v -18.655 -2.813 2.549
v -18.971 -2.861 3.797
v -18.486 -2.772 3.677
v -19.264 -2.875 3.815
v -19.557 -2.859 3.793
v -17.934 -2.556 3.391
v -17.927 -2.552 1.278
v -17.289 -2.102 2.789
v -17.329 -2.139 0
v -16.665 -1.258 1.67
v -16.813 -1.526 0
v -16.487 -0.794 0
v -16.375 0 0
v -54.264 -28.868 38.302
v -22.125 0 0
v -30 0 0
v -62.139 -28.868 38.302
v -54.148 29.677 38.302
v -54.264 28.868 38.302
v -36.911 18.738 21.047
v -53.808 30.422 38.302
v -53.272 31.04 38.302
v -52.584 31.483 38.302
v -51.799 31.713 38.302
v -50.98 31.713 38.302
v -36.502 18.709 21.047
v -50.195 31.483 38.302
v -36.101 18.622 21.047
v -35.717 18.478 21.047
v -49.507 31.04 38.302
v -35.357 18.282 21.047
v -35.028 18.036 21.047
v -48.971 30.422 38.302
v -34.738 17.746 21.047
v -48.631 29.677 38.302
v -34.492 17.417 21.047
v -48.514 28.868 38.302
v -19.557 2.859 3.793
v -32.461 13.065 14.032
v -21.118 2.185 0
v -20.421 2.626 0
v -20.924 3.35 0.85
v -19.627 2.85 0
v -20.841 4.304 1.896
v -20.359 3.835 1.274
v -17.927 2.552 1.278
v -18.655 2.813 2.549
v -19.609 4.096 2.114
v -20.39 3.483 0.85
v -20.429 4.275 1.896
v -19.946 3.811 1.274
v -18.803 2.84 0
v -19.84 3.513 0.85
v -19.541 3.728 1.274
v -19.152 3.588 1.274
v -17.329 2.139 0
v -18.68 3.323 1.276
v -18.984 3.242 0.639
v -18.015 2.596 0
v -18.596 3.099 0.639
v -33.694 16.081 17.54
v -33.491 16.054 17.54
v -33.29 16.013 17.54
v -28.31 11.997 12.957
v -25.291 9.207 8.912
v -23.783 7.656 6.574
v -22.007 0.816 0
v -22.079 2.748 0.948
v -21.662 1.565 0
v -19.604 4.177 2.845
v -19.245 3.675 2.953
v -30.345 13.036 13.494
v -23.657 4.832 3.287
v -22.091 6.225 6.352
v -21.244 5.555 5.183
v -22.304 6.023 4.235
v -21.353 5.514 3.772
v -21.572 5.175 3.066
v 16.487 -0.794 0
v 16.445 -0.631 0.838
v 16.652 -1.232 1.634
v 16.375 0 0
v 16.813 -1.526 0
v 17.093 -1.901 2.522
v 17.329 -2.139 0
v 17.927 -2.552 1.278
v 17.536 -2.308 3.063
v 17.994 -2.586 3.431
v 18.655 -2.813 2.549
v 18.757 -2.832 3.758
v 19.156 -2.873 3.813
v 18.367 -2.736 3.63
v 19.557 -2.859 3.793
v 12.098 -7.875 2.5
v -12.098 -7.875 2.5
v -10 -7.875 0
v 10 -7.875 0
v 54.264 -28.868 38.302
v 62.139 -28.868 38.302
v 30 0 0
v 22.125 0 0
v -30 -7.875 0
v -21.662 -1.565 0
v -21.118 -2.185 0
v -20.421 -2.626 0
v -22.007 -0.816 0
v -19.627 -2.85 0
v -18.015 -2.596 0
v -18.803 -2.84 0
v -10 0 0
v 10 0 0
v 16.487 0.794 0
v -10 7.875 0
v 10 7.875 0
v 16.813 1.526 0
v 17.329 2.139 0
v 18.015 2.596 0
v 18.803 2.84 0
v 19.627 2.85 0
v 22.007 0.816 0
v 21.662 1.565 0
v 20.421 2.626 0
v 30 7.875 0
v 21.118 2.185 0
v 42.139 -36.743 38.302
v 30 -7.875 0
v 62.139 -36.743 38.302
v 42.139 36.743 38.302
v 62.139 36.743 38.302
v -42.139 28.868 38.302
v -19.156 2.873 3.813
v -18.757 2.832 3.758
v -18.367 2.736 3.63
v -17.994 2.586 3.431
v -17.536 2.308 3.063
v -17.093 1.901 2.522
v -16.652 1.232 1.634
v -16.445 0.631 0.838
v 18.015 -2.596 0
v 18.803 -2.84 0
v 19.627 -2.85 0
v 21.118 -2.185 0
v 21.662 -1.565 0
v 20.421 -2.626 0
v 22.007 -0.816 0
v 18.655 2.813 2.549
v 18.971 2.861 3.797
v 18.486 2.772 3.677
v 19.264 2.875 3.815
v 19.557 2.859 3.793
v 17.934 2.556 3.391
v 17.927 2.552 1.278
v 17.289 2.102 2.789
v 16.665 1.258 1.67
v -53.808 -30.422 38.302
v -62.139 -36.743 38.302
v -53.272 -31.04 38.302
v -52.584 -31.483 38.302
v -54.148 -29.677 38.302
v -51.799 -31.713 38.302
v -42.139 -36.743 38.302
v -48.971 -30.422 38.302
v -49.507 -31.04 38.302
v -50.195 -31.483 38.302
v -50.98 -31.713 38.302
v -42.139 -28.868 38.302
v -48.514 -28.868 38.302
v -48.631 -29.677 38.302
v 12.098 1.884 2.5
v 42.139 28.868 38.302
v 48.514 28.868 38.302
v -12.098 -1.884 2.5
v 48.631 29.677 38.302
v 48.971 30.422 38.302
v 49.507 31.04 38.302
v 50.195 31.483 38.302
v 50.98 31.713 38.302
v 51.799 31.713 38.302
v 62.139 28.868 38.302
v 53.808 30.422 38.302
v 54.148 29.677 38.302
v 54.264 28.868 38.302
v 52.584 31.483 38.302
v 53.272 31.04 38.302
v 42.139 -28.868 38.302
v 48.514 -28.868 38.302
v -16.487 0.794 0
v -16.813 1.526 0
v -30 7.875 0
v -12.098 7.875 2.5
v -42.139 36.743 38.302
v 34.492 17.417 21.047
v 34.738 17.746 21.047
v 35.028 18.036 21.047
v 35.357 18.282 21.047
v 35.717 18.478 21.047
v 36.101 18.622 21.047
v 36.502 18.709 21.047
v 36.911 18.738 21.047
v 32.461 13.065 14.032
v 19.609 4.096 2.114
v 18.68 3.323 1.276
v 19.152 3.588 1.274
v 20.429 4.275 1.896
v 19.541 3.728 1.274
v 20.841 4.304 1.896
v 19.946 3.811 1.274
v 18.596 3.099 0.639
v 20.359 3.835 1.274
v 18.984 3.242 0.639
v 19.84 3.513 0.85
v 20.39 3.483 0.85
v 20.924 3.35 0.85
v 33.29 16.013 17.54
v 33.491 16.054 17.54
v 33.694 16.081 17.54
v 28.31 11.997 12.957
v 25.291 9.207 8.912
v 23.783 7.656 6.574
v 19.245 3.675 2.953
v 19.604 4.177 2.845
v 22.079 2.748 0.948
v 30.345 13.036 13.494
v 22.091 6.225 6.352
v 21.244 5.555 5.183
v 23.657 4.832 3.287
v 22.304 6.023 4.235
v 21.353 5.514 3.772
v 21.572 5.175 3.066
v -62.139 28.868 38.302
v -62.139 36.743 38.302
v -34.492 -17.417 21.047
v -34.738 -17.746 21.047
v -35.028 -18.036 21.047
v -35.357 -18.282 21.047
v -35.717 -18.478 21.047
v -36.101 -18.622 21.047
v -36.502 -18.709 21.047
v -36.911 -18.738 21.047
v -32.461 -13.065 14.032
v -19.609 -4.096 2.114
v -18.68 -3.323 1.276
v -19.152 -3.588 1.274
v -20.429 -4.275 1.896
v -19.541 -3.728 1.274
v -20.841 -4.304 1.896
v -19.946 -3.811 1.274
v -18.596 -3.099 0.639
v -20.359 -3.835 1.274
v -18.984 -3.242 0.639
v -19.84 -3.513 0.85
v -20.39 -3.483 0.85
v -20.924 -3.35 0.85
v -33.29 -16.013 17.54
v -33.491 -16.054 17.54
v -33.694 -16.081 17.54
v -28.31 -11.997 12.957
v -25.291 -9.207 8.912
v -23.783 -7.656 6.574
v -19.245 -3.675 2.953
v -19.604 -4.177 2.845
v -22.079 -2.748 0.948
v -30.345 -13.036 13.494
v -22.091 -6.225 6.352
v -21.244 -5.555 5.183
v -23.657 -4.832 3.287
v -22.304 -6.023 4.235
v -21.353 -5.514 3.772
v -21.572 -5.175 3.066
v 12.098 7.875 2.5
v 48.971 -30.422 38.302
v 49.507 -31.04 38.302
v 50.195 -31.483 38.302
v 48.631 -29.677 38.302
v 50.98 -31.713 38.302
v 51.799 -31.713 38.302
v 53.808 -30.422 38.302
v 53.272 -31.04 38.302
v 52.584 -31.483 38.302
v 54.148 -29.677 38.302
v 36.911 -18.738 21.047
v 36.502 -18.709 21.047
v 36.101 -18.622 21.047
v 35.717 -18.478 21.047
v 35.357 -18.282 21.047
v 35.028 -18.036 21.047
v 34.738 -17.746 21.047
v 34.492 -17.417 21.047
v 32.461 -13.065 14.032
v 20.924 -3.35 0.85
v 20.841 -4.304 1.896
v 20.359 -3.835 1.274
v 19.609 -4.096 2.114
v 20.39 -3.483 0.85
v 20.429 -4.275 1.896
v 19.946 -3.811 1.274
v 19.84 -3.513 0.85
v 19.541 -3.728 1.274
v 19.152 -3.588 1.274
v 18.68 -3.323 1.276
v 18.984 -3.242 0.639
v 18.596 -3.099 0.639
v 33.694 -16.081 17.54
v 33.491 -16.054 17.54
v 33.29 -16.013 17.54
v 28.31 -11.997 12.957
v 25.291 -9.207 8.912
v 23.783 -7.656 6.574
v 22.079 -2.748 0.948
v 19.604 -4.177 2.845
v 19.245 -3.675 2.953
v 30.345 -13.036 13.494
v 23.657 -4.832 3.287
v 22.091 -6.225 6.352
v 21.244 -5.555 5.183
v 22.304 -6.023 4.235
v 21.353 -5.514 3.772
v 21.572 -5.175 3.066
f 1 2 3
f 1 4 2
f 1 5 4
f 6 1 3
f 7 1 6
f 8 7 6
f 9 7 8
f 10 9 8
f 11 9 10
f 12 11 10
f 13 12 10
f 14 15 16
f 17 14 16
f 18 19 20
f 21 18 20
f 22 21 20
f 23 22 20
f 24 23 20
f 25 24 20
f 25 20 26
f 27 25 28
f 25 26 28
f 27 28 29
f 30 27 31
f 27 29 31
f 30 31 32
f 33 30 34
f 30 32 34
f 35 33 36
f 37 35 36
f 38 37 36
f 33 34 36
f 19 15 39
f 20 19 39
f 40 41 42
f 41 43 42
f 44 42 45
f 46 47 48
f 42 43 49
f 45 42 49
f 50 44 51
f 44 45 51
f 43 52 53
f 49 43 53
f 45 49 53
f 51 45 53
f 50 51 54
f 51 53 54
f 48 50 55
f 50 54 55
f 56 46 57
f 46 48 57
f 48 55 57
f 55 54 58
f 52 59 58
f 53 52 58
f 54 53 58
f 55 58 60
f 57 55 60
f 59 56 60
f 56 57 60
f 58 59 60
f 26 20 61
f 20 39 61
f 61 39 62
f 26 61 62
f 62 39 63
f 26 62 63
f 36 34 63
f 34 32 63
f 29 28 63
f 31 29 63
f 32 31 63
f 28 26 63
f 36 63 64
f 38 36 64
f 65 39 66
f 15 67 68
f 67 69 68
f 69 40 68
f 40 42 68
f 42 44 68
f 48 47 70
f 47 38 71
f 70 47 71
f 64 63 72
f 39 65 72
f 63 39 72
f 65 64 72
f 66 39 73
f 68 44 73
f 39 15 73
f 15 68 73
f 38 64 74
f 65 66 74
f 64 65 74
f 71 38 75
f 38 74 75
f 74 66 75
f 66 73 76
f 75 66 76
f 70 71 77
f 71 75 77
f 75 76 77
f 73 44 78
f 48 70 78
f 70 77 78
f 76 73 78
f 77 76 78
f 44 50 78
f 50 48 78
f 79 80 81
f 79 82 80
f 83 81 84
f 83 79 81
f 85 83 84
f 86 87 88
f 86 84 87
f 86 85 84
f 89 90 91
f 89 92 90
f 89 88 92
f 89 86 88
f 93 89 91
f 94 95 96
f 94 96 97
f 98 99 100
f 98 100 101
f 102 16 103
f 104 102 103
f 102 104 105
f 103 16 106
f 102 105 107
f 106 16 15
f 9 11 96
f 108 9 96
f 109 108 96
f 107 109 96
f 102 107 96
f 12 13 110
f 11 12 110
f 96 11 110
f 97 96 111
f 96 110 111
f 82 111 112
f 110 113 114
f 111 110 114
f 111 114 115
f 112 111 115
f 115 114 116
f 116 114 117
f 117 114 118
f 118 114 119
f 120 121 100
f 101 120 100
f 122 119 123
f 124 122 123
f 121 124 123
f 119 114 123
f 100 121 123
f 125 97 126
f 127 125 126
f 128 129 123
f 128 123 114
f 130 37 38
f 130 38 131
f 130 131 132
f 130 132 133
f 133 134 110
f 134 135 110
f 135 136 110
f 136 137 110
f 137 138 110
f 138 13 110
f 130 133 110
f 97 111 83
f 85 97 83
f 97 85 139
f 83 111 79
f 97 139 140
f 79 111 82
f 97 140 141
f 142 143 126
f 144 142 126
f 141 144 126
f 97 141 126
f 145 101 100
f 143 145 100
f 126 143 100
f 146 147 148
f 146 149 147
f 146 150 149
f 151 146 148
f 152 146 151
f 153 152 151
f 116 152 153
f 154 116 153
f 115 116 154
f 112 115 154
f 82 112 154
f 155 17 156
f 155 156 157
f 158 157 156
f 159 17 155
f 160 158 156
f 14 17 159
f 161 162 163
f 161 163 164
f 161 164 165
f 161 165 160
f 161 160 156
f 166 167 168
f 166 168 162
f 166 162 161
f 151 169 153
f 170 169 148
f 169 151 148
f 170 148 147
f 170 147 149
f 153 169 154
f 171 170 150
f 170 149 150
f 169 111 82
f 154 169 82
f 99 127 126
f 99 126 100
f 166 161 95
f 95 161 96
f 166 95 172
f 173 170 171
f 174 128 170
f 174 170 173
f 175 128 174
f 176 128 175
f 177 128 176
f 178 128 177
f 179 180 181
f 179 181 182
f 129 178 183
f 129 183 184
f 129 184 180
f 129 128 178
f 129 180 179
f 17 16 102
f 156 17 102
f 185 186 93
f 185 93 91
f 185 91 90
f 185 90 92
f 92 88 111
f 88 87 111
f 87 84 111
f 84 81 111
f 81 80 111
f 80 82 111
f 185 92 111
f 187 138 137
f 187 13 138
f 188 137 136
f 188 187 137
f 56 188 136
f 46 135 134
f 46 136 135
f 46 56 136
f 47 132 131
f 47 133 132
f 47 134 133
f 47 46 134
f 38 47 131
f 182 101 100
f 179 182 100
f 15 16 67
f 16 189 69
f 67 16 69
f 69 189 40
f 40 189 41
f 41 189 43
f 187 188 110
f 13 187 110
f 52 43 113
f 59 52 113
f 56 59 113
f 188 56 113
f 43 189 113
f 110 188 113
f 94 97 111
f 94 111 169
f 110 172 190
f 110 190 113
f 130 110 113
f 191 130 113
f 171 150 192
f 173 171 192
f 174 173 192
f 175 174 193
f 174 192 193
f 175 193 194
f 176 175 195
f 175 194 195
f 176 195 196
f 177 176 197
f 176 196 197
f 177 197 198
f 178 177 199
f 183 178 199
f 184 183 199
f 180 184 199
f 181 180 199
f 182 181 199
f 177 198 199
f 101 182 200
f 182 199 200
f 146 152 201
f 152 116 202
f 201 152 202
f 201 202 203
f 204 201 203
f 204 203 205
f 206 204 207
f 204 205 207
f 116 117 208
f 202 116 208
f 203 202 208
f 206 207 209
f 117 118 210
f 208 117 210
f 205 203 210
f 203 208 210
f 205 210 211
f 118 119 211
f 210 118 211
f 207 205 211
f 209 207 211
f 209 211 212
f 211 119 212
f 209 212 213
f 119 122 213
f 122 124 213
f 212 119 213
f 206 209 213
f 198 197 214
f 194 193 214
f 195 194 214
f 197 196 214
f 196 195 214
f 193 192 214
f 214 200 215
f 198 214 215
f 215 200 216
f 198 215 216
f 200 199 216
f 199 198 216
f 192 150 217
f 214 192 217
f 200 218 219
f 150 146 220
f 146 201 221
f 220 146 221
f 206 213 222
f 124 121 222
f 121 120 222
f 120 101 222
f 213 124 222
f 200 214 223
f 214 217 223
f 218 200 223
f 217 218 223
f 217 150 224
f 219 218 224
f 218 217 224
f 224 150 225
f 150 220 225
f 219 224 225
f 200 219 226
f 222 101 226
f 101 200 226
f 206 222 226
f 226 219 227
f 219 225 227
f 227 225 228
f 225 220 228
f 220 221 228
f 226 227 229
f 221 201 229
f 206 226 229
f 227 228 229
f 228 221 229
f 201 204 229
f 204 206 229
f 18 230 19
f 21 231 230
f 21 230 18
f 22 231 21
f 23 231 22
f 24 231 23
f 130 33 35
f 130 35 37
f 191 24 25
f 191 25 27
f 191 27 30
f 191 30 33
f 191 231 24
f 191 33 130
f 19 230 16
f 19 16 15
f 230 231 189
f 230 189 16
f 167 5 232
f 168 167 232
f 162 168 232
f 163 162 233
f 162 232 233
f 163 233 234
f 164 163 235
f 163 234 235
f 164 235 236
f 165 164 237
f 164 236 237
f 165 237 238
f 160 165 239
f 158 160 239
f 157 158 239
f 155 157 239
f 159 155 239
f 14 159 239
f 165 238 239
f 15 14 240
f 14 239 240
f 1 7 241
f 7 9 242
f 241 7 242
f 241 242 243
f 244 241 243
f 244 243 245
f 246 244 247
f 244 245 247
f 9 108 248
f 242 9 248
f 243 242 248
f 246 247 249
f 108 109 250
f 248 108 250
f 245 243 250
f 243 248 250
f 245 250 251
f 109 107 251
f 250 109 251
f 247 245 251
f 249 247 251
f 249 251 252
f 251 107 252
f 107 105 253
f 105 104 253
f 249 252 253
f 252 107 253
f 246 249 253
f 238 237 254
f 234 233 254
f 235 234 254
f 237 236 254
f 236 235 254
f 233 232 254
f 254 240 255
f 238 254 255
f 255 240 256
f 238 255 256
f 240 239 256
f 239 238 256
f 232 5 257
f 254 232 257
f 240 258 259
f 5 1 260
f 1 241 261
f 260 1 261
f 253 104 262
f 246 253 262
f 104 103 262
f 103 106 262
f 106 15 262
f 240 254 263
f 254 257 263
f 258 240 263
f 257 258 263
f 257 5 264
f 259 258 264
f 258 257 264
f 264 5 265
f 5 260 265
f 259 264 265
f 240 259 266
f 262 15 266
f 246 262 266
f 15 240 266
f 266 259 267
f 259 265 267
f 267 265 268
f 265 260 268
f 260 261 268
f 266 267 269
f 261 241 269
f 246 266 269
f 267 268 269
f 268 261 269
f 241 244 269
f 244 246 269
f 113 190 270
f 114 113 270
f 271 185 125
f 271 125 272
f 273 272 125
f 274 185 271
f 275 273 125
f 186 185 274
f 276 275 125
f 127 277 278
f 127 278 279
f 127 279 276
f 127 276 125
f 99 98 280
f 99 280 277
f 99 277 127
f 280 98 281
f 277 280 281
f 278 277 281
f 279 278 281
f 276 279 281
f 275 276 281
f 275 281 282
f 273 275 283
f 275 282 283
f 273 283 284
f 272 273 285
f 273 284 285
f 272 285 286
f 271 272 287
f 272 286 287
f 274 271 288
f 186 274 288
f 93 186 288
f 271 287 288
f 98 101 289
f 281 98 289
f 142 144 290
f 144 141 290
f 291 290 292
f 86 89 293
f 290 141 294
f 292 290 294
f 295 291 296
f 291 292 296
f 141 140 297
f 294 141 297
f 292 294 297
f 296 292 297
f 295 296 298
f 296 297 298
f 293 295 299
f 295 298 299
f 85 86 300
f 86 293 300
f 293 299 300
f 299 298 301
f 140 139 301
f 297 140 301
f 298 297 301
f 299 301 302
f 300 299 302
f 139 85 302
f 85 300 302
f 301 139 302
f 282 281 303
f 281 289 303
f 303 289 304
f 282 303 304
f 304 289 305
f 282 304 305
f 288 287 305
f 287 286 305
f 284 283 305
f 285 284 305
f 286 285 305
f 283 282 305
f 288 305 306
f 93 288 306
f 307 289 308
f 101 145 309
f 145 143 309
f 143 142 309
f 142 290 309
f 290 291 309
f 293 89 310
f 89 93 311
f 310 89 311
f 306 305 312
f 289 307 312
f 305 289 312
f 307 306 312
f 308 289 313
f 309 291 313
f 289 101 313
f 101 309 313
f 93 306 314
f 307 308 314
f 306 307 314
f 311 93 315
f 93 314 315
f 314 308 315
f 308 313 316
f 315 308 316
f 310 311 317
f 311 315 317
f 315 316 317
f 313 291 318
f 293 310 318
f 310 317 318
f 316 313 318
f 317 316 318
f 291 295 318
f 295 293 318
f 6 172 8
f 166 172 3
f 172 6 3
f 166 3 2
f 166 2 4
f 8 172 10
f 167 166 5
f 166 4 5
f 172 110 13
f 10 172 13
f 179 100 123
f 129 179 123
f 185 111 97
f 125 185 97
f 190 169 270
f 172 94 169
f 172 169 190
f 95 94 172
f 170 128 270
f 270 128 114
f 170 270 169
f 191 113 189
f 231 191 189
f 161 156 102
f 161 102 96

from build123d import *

# Parameters (mm, degrees)
F0_W           = 10
F0_H           = 7.875
F1_DEPTH       = 2.5
F11_DEPTH      = 25
F13_DEPTH      = 7.875
F13_DEPTH_BACK = 7.875


with BuildPart() as f1:
    # F0 (on Top) → F1 (new body)
    with BuildSketch(Plane.XY):
        with Locations((-5, 3.9375)):
            Rectangle(F0_W, F0_H)
        with Locations((5, 3.9375)):
            Rectangle(F0_W, F0_H)
        with Locations((5, -3.9375)):
            Rectangle(F0_W, F0_H)
        with Locations((-5, -3.9375)):
            Rectangle(F0_W, F0_H)
    extrude(amount=F1_DEPTH)

    # F8: sweep along a path in F4
    with BuildLine(Plane(origin=(-5.8682408883, 0, -4.9240387651), x_dir=(0, 1, 0), z_dir=(0.7660444431, 0, 0.6427876097))) as f8_path:
        Line((-28.8675134595, 56.6363319121), (0, 6.6363319121))
    # F0 (on Top) → F8 (sweep)
    with BuildSketch(Plane.XY):
        with BuildLine():
            Line((-10, 0), (-16.375, 0))
            ThreePointArc((-16.375, 0), (-19.25, -2.875), (-22.125, 0))
            Line((-22.125, 0), (-30, 0))
            Line((-30, 0), (-30, -7.875))
            Line((-30, -7.875), (-10, -7.875))
            Line((-10, -7.875), (-10, 0))
        make_face()
    sweep(path=f8_path.line)

    # F10: sweep along a path in F7
    with BuildLine(Plane(origin=(5.8682408883, 0, -4.9240387651), x_dir=(0, 1, 0), z_dir=(0.7660444431, 0, -0.6427876097))) as f10_path:
        Line((28.8675134595, 56.5418889989), (0, 6.5418889989))
    # F0 (on Top) → F10 (sweep)
    with BuildSketch(Plane.XY):
        with BuildLine():
            Line((10, 7.875), (10, 0))
            Line((10, 0), (16.375, 0))
            ThreePointArc((16.375, 0), (19.25, 2.875), (22.125, 0))
            Line((22.125, 0), (30, 0))
            Line((30, 0), (30, 7.875))
            Line((30, 7.875), (10, 7.875))
        make_face()
    sweep(path=f10_path.line)


with BuildPart() as f5:
    # F5: sweep along a path in F4
    with BuildLine(Plane(origin=(-5.8682408883, 0, -4.9240387651), x_dir=(0, 1, 0), z_dir=(0.7660444431, 0, 0.6427876097))) as f5_path:
        Line((28.8675134595, 56.6363319121), (0, 6.6363319121))
    # F0 (on Top) → F5 (sweep)
    with BuildSketch(Plane.XY):
        with BuildLine():
            ThreePointArc((-22.125, 0), (-19.25, 2.875), (-16.375, 0))
            Line((-16.375, 0), (-10, 0))
            Line((-10, 0), (-10, 7.875))
            Line((-10, 7.875), (-30, 7.875))
            Line((-30, 7.875), (-30, 0))
            Line((-30, 0), (-22.125, 0))
        make_face()
    sweep(path=f5_path.line)


with BuildPart() as f9:
    # F9: sweep along a path in F7
    with BuildLine(Plane(origin=(5.8682408883, 0, -4.9240387651), x_dir=(0, 1, 0), z_dir=(0.7660444431, 0, -0.6427876097))) as f9_path:
        Line((-28.8675134595, 56.5418889989), (0, 6.5418889989))
    # F0 (on Top) → F9 (sweep)
    with BuildSketch(Plane.XY):
        with BuildLine():
            Line((16.375, 0), (10, 0))
            Line((10, 0), (10, -7.875))
            Line((10, -7.875), (30, -7.875))
            Line((30, -7.875), (30, 0))
            Line((30, 0), (22.125, 0))
            ThreePointArc((22.125, 0), (19.25, -2.875), (16.375, 0))
        make_face()
    sweep(path=f9_path.line)


with BuildPart() as f11_tool:
    # F0 (on Top) → F11 (new body)
    with BuildSketch(Plane.XY):
        with BuildLine():
            Line((19.25, 0), (16.375, 0))
            ThreePointArc((16.375, 0), (19.25, -2.875), (22.125, 0))
            Line((22.125, 0), (19.25, 0))
        make_face()
        with BuildLine():
            ThreePointArc((22.125, 0), (19.25, 2.875), (16.375, 0))
            Line((16.375, 0), (19.25, 0))
            Line((19.25, 0), (22.125, 0))
        make_face()
        with BuildLine():
            Line((-22.125, 0), (-19.25, 0))
            Line((-19.25, 0), (-16.375, 0))
            ThreePointArc((-16.375, 0), (-19.25, 2.875), (-22.125, 0))
        make_face()
        with BuildLine():
            Line((-16.375, 0), (-19.25, 0))
            Line((-19.25, 0), (-22.125, 0))
            ThreePointArc((-22.125, 0), (-19.25, -2.875), (-16.375, 0))
        make_face()
    extrude(amount=F11_DEPTH)


with BuildPart() as f1_1:
    add(f1.part)

    # F11: cut by f11_tool
    add(f11_tool.part, mode=Mode.SUBTRACT)

    # F12 (on Front) → F13 (join, two sides)
    with BuildSketch(Plane.XZ) as f13_sk:
        Polygon((10, 2.5), (10, 0), (12.0977490779, 2.5), align=None)
        Polygon((-12.0977490779, 2.5), (-10, 0), (-10, 2.5), align=None)
    extrude(amount=F13_DEPTH)
    extrude(f13_sk.sketch, amount=-F13_DEPTH_BACK)


with BuildPart() as f5_1:
    add(f5.part)

    # F11: cut by f11_tool
    add(f11_tool.part, mode=Mode.SUBTRACT)


with BuildPart() as f9_1:
    add(f9.part)

    # F11: cut by f11_tool
    add(f11_tool.part, mode=Mode.SUBTRACT)


solid = Compound([f1_1.part, f5_1.part, f9_1.part])
